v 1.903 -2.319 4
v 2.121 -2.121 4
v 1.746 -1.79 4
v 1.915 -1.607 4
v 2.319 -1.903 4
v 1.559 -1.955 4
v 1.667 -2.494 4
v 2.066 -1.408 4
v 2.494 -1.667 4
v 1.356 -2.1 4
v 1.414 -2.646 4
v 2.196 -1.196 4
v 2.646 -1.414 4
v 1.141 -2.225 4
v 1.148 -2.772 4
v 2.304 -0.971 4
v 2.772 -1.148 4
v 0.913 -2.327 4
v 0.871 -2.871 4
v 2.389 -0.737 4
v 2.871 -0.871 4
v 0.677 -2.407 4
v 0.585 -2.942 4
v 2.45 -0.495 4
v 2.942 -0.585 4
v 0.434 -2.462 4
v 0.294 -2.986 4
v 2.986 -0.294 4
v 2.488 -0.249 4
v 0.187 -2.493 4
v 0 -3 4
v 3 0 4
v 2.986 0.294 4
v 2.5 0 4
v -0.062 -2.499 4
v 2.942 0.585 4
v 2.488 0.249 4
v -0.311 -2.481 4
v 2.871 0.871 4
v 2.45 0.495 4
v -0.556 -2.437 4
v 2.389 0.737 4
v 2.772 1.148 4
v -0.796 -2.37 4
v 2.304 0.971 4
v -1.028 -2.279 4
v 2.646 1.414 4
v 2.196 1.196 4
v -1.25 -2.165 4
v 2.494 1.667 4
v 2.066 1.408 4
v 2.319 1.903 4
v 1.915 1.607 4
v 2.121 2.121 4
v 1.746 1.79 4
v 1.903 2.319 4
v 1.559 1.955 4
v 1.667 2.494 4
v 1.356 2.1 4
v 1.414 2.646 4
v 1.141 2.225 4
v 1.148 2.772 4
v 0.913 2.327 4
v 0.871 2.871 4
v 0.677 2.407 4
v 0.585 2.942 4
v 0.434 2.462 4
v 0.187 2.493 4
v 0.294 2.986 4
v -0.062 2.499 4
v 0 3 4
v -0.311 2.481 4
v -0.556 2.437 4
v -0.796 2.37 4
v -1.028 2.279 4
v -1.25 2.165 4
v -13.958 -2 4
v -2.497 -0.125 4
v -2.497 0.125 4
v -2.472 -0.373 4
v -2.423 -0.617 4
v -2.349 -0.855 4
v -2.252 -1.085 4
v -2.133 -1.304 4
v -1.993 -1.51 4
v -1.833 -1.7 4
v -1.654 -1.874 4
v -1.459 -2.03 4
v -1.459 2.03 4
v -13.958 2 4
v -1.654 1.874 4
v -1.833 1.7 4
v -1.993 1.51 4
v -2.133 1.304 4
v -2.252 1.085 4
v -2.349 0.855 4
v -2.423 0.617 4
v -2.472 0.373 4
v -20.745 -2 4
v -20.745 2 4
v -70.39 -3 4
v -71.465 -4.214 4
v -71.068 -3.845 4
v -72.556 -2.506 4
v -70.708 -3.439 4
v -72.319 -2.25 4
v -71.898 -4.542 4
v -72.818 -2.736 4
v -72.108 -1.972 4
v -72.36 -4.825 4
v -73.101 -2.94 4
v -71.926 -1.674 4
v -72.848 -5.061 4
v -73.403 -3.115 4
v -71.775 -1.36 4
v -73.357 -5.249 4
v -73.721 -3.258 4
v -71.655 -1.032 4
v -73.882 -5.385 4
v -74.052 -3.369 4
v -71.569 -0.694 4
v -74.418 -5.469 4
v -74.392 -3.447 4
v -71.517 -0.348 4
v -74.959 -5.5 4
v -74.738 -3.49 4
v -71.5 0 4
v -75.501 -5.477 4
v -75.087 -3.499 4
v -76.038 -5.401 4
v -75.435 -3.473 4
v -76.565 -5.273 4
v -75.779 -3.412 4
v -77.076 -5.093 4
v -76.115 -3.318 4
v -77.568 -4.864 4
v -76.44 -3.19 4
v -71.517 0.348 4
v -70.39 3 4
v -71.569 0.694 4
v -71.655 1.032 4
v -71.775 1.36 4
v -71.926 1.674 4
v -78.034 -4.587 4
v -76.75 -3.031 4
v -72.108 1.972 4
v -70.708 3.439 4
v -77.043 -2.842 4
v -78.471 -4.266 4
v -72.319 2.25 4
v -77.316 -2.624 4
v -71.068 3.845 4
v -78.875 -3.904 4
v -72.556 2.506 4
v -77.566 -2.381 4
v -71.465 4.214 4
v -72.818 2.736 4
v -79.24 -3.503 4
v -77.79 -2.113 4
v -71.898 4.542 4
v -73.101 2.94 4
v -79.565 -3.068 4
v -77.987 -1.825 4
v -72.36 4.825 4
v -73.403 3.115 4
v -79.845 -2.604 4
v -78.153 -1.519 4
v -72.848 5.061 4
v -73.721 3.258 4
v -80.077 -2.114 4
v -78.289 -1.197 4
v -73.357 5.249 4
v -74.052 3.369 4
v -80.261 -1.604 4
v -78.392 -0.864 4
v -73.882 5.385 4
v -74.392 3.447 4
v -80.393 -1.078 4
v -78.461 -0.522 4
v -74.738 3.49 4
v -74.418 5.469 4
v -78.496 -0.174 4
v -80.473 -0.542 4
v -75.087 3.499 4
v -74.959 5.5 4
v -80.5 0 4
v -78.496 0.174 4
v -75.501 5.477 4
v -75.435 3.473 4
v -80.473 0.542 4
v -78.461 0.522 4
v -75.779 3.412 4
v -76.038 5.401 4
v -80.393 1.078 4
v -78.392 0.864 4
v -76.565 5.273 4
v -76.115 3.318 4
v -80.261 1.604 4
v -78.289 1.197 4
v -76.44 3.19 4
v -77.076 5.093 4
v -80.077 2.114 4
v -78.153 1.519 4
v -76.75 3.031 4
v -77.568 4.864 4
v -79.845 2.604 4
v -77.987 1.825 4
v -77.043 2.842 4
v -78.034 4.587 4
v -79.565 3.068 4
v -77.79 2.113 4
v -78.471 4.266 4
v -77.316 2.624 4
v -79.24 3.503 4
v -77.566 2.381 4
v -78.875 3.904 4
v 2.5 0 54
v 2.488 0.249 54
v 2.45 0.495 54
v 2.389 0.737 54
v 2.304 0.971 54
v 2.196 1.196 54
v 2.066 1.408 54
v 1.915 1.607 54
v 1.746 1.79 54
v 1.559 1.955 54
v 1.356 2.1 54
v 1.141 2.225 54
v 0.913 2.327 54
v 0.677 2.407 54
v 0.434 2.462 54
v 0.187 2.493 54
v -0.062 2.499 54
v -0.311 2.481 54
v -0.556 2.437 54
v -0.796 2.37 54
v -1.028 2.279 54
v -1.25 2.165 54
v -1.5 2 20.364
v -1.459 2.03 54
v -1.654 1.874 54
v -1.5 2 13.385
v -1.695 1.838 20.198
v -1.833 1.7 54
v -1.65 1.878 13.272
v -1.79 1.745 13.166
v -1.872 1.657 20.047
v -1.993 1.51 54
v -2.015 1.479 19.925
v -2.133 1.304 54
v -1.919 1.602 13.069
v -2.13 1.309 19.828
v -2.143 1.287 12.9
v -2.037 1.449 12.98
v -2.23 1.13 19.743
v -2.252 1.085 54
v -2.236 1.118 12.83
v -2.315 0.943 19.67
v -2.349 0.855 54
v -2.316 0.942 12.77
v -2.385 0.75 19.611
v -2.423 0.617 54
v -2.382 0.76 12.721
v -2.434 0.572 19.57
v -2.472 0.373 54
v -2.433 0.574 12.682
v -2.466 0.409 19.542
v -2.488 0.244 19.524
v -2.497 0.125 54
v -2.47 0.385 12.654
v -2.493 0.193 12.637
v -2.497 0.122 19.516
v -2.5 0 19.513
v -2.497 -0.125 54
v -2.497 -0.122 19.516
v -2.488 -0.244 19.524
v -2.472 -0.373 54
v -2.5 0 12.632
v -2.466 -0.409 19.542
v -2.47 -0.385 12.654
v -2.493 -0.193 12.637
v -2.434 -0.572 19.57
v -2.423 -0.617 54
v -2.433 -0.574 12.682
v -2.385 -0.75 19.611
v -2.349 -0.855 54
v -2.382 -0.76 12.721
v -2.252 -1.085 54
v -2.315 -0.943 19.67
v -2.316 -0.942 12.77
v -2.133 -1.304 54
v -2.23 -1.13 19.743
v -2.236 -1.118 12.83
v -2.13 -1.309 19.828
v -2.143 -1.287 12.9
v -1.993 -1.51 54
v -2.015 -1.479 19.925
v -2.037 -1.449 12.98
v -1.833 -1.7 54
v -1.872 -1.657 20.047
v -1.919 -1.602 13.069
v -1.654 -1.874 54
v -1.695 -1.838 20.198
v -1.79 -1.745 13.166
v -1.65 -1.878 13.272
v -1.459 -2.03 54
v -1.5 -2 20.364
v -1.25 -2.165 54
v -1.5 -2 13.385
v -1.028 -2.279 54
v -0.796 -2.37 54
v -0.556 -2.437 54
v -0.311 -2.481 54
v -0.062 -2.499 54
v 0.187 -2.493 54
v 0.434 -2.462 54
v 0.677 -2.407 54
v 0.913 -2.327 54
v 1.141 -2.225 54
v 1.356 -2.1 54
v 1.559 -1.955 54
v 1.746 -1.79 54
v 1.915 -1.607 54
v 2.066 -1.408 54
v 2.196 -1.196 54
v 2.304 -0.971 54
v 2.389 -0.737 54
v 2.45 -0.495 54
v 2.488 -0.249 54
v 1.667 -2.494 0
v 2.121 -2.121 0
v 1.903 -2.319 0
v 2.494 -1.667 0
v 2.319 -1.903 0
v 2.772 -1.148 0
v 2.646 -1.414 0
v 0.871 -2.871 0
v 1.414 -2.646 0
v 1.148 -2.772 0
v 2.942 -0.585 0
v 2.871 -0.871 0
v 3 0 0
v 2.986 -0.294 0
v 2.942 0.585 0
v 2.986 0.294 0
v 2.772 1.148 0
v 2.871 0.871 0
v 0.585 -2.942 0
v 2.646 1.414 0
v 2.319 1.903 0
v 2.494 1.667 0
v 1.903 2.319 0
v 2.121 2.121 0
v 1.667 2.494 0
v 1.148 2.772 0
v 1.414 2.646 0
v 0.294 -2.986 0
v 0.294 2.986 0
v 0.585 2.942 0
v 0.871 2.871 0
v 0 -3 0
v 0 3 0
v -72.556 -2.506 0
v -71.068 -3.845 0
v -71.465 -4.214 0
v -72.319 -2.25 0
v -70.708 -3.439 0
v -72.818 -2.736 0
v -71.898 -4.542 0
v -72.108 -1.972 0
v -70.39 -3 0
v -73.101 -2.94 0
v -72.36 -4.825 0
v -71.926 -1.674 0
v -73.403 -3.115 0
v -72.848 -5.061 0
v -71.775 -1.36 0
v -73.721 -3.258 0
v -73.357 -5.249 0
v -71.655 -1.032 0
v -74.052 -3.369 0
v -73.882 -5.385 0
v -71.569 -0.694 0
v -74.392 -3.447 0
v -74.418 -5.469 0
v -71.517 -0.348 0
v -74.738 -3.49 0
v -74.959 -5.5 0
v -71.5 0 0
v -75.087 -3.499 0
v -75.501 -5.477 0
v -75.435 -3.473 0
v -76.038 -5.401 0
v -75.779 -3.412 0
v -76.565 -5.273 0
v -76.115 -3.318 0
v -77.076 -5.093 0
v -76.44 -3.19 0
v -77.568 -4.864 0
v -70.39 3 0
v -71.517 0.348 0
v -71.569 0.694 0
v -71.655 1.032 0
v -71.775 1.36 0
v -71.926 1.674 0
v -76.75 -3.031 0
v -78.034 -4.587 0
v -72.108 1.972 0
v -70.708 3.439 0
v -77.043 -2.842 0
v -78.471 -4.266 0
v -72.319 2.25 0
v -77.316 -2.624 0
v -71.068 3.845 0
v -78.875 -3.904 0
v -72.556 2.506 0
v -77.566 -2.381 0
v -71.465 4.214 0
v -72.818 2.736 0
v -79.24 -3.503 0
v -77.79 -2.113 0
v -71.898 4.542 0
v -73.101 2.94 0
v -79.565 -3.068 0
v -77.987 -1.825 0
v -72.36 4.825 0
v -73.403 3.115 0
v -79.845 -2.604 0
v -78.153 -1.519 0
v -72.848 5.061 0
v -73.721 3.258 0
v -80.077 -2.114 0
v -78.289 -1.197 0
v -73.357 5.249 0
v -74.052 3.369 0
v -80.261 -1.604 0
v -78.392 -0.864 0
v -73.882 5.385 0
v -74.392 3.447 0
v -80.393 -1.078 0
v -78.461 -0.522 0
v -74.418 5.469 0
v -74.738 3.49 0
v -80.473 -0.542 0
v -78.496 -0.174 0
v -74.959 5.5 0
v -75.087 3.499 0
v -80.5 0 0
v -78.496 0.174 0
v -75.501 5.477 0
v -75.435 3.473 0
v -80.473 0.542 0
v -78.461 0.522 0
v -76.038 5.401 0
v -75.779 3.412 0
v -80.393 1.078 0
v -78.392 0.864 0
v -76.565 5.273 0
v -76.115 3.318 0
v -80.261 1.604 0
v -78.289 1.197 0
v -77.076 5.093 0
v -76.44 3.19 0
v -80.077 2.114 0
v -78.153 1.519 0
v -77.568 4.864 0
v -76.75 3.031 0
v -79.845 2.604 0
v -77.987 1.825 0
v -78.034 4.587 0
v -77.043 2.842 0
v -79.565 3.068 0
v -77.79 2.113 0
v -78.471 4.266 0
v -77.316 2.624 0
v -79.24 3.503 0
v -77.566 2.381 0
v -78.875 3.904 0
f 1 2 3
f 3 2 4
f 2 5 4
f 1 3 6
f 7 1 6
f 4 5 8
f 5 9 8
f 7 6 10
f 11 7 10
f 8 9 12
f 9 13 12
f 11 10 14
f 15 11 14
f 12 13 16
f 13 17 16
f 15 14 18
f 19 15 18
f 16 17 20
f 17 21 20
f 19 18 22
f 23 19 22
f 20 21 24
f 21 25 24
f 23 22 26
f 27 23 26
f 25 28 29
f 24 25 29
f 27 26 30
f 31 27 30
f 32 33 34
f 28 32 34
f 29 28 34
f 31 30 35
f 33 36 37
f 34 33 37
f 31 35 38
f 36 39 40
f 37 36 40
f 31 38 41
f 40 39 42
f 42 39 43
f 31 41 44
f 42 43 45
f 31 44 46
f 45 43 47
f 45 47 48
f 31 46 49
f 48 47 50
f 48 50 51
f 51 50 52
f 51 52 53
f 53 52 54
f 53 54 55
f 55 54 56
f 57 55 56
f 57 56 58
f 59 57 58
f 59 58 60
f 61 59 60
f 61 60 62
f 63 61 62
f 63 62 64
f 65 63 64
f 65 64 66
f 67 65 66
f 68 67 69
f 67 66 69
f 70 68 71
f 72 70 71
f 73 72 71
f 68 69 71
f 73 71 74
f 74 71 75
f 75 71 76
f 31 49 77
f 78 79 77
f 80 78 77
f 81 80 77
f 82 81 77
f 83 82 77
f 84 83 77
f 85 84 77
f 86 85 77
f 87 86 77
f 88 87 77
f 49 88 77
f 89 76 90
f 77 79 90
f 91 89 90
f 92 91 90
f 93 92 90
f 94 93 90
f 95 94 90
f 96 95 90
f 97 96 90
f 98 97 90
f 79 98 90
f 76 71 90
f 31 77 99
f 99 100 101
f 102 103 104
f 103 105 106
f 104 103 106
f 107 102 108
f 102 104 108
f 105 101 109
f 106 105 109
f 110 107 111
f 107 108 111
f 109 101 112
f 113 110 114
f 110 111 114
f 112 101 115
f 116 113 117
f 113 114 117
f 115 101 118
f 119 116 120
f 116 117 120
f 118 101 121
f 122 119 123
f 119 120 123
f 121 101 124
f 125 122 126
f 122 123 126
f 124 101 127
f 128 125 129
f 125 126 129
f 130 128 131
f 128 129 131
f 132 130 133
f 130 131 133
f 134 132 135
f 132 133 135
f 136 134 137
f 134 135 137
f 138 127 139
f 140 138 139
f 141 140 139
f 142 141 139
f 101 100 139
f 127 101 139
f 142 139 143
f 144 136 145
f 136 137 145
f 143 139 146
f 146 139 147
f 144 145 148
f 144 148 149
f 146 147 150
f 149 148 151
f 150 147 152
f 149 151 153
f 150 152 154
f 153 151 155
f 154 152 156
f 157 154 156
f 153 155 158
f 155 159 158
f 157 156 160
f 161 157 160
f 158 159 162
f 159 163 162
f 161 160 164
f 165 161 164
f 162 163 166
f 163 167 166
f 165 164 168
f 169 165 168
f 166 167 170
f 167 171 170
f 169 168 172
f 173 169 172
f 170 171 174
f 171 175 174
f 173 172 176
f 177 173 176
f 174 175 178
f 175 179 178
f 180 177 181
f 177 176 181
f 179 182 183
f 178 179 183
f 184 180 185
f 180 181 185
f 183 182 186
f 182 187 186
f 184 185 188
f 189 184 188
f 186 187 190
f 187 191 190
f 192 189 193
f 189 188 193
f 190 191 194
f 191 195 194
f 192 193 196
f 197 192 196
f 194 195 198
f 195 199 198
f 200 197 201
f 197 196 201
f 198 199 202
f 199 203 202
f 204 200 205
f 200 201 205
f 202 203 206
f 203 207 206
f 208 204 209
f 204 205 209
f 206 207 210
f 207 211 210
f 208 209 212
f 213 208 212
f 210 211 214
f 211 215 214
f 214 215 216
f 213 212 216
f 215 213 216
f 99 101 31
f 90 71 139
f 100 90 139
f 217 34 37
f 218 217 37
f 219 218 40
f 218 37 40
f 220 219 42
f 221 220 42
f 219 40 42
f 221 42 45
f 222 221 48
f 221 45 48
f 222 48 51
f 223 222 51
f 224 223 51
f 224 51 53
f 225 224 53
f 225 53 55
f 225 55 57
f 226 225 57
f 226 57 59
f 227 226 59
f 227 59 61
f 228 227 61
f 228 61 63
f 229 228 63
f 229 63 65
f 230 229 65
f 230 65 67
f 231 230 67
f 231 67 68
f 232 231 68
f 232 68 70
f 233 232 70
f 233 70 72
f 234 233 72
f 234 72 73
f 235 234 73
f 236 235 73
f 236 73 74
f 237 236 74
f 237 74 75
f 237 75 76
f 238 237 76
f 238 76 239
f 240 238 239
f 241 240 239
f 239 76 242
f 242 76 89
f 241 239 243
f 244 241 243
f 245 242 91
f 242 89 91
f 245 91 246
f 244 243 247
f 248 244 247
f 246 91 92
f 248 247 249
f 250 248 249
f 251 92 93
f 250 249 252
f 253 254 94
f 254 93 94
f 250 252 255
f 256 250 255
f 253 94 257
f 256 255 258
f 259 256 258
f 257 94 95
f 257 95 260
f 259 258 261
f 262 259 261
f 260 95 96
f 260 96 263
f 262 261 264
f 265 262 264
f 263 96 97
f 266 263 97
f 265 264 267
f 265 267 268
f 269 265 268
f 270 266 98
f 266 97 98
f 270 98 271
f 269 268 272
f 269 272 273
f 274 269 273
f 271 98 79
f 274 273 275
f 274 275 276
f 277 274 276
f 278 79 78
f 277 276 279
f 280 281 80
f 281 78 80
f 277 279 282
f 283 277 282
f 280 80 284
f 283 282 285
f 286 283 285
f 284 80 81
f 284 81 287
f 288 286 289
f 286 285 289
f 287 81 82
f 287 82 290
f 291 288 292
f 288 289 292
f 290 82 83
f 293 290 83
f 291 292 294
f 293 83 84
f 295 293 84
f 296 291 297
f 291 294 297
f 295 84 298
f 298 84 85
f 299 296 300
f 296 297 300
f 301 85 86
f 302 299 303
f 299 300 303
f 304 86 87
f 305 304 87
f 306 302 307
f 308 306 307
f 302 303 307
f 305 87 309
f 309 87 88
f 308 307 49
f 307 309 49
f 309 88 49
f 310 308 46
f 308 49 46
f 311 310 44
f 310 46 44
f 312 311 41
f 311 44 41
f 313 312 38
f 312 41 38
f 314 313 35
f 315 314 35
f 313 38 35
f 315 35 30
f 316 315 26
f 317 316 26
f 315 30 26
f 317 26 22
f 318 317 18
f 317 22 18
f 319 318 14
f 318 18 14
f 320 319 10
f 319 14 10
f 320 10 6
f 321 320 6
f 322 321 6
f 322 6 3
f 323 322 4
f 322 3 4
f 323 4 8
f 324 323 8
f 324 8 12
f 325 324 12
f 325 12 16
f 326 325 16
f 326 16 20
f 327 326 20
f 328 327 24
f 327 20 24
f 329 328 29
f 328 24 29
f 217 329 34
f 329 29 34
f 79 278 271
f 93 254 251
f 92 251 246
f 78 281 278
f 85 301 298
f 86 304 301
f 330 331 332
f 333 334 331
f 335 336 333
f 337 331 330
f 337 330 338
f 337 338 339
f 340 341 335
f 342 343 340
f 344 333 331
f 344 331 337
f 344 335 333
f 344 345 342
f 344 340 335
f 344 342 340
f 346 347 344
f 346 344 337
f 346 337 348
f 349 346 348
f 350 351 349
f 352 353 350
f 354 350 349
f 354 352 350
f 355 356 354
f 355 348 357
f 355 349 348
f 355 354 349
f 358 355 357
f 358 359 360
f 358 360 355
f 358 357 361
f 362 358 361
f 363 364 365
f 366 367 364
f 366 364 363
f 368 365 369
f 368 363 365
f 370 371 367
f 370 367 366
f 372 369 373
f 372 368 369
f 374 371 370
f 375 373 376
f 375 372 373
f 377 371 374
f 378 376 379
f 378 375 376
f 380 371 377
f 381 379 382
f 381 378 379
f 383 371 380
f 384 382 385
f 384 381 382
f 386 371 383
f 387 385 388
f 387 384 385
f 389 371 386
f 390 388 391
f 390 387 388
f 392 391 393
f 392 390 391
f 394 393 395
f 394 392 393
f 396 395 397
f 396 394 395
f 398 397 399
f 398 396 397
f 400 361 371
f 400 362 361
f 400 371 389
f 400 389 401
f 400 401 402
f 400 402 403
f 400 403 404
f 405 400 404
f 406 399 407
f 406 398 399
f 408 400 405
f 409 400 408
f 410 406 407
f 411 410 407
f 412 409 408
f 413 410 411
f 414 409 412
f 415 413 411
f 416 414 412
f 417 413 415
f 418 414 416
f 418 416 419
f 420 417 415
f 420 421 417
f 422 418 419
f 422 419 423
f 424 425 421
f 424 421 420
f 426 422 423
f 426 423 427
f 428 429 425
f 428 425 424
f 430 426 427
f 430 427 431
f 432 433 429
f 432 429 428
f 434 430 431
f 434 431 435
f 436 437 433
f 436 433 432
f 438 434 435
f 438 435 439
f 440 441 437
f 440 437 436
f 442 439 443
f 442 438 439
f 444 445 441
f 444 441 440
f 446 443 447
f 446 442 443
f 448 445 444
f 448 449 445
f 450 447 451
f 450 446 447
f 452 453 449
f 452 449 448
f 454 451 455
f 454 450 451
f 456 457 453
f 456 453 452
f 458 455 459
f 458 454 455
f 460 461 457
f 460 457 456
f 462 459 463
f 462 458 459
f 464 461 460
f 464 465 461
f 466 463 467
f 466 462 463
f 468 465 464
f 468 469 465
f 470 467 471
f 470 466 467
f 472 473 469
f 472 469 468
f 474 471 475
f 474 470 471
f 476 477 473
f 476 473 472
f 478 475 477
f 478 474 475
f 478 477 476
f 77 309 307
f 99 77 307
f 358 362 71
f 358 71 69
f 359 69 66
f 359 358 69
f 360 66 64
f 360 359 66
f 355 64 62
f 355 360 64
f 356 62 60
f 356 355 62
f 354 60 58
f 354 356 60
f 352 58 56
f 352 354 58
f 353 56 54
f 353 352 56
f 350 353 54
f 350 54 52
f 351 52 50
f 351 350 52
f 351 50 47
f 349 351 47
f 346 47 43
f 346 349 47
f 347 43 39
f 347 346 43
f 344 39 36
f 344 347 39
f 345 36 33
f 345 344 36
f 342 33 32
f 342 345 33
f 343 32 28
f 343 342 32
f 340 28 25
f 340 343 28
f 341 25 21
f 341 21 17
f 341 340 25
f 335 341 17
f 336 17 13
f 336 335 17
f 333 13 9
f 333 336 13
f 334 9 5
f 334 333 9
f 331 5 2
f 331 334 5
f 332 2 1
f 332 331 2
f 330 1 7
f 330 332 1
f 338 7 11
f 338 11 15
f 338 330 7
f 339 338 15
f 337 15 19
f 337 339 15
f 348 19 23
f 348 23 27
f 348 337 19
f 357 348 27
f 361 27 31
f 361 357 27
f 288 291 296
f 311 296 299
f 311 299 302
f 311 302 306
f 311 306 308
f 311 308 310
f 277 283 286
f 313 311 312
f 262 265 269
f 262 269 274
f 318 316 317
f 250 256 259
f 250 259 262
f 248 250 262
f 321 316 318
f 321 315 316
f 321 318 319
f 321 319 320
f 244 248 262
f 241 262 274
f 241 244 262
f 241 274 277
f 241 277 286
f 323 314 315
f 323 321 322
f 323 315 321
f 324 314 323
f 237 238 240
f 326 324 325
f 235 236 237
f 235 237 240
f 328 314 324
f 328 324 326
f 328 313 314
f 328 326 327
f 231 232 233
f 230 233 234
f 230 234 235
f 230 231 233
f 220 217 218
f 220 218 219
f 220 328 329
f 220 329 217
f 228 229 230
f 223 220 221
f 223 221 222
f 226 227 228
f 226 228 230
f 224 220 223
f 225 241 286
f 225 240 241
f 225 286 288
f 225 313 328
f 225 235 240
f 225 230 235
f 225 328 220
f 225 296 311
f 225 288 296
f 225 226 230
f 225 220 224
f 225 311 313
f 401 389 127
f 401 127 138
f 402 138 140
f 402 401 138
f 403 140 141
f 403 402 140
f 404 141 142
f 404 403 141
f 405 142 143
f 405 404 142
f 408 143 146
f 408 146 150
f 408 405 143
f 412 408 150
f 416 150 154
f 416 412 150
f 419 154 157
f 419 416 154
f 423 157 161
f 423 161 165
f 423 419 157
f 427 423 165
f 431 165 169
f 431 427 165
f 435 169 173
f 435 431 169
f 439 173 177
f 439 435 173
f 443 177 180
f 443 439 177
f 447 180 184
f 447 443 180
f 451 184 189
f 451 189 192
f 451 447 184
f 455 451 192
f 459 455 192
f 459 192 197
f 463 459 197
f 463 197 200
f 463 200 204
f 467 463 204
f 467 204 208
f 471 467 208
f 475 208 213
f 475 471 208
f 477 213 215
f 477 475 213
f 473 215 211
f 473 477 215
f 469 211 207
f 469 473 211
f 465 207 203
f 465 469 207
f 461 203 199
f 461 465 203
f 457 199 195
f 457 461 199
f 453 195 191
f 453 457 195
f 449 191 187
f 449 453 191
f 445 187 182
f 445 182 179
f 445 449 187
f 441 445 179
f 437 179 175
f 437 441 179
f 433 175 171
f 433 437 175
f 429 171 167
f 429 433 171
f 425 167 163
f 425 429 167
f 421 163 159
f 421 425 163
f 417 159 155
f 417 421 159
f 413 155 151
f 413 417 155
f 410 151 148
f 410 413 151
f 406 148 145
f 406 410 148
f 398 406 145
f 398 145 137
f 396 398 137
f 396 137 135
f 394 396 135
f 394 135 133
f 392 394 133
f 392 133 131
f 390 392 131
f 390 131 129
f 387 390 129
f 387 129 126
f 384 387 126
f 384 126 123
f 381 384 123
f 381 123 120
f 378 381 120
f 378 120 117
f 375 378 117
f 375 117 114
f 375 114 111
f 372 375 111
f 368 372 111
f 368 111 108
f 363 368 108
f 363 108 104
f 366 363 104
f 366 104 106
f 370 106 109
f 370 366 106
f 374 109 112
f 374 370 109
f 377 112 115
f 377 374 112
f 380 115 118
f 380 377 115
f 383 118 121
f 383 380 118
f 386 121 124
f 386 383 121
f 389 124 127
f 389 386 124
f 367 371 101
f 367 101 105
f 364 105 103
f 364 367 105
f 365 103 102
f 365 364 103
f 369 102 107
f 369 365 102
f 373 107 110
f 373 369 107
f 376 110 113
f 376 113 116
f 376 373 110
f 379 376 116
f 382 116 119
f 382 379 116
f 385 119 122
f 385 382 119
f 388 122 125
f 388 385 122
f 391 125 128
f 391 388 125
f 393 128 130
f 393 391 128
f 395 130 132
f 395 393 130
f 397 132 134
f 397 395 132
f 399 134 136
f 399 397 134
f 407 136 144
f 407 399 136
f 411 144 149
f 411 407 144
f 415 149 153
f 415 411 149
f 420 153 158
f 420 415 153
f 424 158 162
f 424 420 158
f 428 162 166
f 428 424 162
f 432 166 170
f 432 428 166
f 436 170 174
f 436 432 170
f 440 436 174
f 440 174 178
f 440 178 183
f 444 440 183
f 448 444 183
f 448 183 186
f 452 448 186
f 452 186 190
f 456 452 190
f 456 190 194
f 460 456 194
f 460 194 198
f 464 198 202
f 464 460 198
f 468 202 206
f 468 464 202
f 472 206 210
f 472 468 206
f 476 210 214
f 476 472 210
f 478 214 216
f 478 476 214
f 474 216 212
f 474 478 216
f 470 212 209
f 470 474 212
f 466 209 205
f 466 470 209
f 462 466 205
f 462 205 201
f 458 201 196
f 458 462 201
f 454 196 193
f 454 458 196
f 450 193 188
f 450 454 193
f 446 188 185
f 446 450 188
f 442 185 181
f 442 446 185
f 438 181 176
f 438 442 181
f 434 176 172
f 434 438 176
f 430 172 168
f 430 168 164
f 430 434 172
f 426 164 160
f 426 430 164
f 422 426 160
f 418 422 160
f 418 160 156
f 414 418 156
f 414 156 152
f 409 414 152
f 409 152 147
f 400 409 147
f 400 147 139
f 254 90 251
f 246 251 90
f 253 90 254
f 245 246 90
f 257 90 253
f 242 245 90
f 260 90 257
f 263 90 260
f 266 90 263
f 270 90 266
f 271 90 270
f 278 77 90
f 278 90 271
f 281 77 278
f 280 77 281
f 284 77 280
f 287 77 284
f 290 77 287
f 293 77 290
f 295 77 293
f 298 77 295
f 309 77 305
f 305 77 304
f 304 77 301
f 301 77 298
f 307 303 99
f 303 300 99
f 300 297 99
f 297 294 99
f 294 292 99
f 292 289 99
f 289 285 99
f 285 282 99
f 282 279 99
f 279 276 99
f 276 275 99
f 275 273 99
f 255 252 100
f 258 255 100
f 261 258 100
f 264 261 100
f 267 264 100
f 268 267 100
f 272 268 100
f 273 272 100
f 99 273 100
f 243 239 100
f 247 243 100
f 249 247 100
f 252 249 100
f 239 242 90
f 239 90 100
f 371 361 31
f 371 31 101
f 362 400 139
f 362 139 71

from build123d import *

# Parameters (mm, degrees)
SKETCH1_R                = 3.5
BOSS_EXTRUDE1_DEPTH      = 4
SKETCH2_R                = 2.5
BOSS_EXTRUDE2_DEPTH      = 50
BOSS_EXTRUDE3_DEPTH      = 2
BOSS_EXTRUDE3_DEPTH_BACK = 2


with BuildPart() as part:
    # Sketch1 → Boss-Extrude1 (new body)
    with BuildSketch(Plane.XY):
        with BuildLine():
            Line((0, -3), (-70.390227771, -3))
            ThreePointArc((-70.390227771, -3), (-80.5, 0), (-70.390227771, 3))
            Line((-70.390227771, 3), (0, 3))
            ThreePointArc((0, 3), (3, 0), (0, -3))
        make_face()
        with Locations((-75, 0)):
            Circle(SKETCH1_R, mode=Mode.SUBTRACT)
    extrude(amount=BOSS_EXTRUDE1_DEPTH)

    # Sketch2 → Boss-Extrude2 (add)
    with BuildSketch(Plane.XY.offset(4)):
        Circle(SKETCH2_R)
    extrude(amount=BOSS_EXTRUDE2_DEPTH)

    # Sketch3 → Boss-Extrude3 (add, two sides)
    with BuildSketch(Plane(origin=(0, 0, 0), x_dir=(1, 0, 0), z_dir=(0, 1, 0))) as boss_extrude3_sk:
        Polygon((-22.626919406, -2.400081024), (-16.082292112, -2.400081024), (0, -14.514826908), (0, -21.639035848), align=None)
    extrude(amount=BOSS_EXTRUDE3_DEPTH)
    extrude(boss_extrude3_sk.sketch, amount=-BOSS_EXTRUDE3_DEPTH_BACK)


solid = part.part
